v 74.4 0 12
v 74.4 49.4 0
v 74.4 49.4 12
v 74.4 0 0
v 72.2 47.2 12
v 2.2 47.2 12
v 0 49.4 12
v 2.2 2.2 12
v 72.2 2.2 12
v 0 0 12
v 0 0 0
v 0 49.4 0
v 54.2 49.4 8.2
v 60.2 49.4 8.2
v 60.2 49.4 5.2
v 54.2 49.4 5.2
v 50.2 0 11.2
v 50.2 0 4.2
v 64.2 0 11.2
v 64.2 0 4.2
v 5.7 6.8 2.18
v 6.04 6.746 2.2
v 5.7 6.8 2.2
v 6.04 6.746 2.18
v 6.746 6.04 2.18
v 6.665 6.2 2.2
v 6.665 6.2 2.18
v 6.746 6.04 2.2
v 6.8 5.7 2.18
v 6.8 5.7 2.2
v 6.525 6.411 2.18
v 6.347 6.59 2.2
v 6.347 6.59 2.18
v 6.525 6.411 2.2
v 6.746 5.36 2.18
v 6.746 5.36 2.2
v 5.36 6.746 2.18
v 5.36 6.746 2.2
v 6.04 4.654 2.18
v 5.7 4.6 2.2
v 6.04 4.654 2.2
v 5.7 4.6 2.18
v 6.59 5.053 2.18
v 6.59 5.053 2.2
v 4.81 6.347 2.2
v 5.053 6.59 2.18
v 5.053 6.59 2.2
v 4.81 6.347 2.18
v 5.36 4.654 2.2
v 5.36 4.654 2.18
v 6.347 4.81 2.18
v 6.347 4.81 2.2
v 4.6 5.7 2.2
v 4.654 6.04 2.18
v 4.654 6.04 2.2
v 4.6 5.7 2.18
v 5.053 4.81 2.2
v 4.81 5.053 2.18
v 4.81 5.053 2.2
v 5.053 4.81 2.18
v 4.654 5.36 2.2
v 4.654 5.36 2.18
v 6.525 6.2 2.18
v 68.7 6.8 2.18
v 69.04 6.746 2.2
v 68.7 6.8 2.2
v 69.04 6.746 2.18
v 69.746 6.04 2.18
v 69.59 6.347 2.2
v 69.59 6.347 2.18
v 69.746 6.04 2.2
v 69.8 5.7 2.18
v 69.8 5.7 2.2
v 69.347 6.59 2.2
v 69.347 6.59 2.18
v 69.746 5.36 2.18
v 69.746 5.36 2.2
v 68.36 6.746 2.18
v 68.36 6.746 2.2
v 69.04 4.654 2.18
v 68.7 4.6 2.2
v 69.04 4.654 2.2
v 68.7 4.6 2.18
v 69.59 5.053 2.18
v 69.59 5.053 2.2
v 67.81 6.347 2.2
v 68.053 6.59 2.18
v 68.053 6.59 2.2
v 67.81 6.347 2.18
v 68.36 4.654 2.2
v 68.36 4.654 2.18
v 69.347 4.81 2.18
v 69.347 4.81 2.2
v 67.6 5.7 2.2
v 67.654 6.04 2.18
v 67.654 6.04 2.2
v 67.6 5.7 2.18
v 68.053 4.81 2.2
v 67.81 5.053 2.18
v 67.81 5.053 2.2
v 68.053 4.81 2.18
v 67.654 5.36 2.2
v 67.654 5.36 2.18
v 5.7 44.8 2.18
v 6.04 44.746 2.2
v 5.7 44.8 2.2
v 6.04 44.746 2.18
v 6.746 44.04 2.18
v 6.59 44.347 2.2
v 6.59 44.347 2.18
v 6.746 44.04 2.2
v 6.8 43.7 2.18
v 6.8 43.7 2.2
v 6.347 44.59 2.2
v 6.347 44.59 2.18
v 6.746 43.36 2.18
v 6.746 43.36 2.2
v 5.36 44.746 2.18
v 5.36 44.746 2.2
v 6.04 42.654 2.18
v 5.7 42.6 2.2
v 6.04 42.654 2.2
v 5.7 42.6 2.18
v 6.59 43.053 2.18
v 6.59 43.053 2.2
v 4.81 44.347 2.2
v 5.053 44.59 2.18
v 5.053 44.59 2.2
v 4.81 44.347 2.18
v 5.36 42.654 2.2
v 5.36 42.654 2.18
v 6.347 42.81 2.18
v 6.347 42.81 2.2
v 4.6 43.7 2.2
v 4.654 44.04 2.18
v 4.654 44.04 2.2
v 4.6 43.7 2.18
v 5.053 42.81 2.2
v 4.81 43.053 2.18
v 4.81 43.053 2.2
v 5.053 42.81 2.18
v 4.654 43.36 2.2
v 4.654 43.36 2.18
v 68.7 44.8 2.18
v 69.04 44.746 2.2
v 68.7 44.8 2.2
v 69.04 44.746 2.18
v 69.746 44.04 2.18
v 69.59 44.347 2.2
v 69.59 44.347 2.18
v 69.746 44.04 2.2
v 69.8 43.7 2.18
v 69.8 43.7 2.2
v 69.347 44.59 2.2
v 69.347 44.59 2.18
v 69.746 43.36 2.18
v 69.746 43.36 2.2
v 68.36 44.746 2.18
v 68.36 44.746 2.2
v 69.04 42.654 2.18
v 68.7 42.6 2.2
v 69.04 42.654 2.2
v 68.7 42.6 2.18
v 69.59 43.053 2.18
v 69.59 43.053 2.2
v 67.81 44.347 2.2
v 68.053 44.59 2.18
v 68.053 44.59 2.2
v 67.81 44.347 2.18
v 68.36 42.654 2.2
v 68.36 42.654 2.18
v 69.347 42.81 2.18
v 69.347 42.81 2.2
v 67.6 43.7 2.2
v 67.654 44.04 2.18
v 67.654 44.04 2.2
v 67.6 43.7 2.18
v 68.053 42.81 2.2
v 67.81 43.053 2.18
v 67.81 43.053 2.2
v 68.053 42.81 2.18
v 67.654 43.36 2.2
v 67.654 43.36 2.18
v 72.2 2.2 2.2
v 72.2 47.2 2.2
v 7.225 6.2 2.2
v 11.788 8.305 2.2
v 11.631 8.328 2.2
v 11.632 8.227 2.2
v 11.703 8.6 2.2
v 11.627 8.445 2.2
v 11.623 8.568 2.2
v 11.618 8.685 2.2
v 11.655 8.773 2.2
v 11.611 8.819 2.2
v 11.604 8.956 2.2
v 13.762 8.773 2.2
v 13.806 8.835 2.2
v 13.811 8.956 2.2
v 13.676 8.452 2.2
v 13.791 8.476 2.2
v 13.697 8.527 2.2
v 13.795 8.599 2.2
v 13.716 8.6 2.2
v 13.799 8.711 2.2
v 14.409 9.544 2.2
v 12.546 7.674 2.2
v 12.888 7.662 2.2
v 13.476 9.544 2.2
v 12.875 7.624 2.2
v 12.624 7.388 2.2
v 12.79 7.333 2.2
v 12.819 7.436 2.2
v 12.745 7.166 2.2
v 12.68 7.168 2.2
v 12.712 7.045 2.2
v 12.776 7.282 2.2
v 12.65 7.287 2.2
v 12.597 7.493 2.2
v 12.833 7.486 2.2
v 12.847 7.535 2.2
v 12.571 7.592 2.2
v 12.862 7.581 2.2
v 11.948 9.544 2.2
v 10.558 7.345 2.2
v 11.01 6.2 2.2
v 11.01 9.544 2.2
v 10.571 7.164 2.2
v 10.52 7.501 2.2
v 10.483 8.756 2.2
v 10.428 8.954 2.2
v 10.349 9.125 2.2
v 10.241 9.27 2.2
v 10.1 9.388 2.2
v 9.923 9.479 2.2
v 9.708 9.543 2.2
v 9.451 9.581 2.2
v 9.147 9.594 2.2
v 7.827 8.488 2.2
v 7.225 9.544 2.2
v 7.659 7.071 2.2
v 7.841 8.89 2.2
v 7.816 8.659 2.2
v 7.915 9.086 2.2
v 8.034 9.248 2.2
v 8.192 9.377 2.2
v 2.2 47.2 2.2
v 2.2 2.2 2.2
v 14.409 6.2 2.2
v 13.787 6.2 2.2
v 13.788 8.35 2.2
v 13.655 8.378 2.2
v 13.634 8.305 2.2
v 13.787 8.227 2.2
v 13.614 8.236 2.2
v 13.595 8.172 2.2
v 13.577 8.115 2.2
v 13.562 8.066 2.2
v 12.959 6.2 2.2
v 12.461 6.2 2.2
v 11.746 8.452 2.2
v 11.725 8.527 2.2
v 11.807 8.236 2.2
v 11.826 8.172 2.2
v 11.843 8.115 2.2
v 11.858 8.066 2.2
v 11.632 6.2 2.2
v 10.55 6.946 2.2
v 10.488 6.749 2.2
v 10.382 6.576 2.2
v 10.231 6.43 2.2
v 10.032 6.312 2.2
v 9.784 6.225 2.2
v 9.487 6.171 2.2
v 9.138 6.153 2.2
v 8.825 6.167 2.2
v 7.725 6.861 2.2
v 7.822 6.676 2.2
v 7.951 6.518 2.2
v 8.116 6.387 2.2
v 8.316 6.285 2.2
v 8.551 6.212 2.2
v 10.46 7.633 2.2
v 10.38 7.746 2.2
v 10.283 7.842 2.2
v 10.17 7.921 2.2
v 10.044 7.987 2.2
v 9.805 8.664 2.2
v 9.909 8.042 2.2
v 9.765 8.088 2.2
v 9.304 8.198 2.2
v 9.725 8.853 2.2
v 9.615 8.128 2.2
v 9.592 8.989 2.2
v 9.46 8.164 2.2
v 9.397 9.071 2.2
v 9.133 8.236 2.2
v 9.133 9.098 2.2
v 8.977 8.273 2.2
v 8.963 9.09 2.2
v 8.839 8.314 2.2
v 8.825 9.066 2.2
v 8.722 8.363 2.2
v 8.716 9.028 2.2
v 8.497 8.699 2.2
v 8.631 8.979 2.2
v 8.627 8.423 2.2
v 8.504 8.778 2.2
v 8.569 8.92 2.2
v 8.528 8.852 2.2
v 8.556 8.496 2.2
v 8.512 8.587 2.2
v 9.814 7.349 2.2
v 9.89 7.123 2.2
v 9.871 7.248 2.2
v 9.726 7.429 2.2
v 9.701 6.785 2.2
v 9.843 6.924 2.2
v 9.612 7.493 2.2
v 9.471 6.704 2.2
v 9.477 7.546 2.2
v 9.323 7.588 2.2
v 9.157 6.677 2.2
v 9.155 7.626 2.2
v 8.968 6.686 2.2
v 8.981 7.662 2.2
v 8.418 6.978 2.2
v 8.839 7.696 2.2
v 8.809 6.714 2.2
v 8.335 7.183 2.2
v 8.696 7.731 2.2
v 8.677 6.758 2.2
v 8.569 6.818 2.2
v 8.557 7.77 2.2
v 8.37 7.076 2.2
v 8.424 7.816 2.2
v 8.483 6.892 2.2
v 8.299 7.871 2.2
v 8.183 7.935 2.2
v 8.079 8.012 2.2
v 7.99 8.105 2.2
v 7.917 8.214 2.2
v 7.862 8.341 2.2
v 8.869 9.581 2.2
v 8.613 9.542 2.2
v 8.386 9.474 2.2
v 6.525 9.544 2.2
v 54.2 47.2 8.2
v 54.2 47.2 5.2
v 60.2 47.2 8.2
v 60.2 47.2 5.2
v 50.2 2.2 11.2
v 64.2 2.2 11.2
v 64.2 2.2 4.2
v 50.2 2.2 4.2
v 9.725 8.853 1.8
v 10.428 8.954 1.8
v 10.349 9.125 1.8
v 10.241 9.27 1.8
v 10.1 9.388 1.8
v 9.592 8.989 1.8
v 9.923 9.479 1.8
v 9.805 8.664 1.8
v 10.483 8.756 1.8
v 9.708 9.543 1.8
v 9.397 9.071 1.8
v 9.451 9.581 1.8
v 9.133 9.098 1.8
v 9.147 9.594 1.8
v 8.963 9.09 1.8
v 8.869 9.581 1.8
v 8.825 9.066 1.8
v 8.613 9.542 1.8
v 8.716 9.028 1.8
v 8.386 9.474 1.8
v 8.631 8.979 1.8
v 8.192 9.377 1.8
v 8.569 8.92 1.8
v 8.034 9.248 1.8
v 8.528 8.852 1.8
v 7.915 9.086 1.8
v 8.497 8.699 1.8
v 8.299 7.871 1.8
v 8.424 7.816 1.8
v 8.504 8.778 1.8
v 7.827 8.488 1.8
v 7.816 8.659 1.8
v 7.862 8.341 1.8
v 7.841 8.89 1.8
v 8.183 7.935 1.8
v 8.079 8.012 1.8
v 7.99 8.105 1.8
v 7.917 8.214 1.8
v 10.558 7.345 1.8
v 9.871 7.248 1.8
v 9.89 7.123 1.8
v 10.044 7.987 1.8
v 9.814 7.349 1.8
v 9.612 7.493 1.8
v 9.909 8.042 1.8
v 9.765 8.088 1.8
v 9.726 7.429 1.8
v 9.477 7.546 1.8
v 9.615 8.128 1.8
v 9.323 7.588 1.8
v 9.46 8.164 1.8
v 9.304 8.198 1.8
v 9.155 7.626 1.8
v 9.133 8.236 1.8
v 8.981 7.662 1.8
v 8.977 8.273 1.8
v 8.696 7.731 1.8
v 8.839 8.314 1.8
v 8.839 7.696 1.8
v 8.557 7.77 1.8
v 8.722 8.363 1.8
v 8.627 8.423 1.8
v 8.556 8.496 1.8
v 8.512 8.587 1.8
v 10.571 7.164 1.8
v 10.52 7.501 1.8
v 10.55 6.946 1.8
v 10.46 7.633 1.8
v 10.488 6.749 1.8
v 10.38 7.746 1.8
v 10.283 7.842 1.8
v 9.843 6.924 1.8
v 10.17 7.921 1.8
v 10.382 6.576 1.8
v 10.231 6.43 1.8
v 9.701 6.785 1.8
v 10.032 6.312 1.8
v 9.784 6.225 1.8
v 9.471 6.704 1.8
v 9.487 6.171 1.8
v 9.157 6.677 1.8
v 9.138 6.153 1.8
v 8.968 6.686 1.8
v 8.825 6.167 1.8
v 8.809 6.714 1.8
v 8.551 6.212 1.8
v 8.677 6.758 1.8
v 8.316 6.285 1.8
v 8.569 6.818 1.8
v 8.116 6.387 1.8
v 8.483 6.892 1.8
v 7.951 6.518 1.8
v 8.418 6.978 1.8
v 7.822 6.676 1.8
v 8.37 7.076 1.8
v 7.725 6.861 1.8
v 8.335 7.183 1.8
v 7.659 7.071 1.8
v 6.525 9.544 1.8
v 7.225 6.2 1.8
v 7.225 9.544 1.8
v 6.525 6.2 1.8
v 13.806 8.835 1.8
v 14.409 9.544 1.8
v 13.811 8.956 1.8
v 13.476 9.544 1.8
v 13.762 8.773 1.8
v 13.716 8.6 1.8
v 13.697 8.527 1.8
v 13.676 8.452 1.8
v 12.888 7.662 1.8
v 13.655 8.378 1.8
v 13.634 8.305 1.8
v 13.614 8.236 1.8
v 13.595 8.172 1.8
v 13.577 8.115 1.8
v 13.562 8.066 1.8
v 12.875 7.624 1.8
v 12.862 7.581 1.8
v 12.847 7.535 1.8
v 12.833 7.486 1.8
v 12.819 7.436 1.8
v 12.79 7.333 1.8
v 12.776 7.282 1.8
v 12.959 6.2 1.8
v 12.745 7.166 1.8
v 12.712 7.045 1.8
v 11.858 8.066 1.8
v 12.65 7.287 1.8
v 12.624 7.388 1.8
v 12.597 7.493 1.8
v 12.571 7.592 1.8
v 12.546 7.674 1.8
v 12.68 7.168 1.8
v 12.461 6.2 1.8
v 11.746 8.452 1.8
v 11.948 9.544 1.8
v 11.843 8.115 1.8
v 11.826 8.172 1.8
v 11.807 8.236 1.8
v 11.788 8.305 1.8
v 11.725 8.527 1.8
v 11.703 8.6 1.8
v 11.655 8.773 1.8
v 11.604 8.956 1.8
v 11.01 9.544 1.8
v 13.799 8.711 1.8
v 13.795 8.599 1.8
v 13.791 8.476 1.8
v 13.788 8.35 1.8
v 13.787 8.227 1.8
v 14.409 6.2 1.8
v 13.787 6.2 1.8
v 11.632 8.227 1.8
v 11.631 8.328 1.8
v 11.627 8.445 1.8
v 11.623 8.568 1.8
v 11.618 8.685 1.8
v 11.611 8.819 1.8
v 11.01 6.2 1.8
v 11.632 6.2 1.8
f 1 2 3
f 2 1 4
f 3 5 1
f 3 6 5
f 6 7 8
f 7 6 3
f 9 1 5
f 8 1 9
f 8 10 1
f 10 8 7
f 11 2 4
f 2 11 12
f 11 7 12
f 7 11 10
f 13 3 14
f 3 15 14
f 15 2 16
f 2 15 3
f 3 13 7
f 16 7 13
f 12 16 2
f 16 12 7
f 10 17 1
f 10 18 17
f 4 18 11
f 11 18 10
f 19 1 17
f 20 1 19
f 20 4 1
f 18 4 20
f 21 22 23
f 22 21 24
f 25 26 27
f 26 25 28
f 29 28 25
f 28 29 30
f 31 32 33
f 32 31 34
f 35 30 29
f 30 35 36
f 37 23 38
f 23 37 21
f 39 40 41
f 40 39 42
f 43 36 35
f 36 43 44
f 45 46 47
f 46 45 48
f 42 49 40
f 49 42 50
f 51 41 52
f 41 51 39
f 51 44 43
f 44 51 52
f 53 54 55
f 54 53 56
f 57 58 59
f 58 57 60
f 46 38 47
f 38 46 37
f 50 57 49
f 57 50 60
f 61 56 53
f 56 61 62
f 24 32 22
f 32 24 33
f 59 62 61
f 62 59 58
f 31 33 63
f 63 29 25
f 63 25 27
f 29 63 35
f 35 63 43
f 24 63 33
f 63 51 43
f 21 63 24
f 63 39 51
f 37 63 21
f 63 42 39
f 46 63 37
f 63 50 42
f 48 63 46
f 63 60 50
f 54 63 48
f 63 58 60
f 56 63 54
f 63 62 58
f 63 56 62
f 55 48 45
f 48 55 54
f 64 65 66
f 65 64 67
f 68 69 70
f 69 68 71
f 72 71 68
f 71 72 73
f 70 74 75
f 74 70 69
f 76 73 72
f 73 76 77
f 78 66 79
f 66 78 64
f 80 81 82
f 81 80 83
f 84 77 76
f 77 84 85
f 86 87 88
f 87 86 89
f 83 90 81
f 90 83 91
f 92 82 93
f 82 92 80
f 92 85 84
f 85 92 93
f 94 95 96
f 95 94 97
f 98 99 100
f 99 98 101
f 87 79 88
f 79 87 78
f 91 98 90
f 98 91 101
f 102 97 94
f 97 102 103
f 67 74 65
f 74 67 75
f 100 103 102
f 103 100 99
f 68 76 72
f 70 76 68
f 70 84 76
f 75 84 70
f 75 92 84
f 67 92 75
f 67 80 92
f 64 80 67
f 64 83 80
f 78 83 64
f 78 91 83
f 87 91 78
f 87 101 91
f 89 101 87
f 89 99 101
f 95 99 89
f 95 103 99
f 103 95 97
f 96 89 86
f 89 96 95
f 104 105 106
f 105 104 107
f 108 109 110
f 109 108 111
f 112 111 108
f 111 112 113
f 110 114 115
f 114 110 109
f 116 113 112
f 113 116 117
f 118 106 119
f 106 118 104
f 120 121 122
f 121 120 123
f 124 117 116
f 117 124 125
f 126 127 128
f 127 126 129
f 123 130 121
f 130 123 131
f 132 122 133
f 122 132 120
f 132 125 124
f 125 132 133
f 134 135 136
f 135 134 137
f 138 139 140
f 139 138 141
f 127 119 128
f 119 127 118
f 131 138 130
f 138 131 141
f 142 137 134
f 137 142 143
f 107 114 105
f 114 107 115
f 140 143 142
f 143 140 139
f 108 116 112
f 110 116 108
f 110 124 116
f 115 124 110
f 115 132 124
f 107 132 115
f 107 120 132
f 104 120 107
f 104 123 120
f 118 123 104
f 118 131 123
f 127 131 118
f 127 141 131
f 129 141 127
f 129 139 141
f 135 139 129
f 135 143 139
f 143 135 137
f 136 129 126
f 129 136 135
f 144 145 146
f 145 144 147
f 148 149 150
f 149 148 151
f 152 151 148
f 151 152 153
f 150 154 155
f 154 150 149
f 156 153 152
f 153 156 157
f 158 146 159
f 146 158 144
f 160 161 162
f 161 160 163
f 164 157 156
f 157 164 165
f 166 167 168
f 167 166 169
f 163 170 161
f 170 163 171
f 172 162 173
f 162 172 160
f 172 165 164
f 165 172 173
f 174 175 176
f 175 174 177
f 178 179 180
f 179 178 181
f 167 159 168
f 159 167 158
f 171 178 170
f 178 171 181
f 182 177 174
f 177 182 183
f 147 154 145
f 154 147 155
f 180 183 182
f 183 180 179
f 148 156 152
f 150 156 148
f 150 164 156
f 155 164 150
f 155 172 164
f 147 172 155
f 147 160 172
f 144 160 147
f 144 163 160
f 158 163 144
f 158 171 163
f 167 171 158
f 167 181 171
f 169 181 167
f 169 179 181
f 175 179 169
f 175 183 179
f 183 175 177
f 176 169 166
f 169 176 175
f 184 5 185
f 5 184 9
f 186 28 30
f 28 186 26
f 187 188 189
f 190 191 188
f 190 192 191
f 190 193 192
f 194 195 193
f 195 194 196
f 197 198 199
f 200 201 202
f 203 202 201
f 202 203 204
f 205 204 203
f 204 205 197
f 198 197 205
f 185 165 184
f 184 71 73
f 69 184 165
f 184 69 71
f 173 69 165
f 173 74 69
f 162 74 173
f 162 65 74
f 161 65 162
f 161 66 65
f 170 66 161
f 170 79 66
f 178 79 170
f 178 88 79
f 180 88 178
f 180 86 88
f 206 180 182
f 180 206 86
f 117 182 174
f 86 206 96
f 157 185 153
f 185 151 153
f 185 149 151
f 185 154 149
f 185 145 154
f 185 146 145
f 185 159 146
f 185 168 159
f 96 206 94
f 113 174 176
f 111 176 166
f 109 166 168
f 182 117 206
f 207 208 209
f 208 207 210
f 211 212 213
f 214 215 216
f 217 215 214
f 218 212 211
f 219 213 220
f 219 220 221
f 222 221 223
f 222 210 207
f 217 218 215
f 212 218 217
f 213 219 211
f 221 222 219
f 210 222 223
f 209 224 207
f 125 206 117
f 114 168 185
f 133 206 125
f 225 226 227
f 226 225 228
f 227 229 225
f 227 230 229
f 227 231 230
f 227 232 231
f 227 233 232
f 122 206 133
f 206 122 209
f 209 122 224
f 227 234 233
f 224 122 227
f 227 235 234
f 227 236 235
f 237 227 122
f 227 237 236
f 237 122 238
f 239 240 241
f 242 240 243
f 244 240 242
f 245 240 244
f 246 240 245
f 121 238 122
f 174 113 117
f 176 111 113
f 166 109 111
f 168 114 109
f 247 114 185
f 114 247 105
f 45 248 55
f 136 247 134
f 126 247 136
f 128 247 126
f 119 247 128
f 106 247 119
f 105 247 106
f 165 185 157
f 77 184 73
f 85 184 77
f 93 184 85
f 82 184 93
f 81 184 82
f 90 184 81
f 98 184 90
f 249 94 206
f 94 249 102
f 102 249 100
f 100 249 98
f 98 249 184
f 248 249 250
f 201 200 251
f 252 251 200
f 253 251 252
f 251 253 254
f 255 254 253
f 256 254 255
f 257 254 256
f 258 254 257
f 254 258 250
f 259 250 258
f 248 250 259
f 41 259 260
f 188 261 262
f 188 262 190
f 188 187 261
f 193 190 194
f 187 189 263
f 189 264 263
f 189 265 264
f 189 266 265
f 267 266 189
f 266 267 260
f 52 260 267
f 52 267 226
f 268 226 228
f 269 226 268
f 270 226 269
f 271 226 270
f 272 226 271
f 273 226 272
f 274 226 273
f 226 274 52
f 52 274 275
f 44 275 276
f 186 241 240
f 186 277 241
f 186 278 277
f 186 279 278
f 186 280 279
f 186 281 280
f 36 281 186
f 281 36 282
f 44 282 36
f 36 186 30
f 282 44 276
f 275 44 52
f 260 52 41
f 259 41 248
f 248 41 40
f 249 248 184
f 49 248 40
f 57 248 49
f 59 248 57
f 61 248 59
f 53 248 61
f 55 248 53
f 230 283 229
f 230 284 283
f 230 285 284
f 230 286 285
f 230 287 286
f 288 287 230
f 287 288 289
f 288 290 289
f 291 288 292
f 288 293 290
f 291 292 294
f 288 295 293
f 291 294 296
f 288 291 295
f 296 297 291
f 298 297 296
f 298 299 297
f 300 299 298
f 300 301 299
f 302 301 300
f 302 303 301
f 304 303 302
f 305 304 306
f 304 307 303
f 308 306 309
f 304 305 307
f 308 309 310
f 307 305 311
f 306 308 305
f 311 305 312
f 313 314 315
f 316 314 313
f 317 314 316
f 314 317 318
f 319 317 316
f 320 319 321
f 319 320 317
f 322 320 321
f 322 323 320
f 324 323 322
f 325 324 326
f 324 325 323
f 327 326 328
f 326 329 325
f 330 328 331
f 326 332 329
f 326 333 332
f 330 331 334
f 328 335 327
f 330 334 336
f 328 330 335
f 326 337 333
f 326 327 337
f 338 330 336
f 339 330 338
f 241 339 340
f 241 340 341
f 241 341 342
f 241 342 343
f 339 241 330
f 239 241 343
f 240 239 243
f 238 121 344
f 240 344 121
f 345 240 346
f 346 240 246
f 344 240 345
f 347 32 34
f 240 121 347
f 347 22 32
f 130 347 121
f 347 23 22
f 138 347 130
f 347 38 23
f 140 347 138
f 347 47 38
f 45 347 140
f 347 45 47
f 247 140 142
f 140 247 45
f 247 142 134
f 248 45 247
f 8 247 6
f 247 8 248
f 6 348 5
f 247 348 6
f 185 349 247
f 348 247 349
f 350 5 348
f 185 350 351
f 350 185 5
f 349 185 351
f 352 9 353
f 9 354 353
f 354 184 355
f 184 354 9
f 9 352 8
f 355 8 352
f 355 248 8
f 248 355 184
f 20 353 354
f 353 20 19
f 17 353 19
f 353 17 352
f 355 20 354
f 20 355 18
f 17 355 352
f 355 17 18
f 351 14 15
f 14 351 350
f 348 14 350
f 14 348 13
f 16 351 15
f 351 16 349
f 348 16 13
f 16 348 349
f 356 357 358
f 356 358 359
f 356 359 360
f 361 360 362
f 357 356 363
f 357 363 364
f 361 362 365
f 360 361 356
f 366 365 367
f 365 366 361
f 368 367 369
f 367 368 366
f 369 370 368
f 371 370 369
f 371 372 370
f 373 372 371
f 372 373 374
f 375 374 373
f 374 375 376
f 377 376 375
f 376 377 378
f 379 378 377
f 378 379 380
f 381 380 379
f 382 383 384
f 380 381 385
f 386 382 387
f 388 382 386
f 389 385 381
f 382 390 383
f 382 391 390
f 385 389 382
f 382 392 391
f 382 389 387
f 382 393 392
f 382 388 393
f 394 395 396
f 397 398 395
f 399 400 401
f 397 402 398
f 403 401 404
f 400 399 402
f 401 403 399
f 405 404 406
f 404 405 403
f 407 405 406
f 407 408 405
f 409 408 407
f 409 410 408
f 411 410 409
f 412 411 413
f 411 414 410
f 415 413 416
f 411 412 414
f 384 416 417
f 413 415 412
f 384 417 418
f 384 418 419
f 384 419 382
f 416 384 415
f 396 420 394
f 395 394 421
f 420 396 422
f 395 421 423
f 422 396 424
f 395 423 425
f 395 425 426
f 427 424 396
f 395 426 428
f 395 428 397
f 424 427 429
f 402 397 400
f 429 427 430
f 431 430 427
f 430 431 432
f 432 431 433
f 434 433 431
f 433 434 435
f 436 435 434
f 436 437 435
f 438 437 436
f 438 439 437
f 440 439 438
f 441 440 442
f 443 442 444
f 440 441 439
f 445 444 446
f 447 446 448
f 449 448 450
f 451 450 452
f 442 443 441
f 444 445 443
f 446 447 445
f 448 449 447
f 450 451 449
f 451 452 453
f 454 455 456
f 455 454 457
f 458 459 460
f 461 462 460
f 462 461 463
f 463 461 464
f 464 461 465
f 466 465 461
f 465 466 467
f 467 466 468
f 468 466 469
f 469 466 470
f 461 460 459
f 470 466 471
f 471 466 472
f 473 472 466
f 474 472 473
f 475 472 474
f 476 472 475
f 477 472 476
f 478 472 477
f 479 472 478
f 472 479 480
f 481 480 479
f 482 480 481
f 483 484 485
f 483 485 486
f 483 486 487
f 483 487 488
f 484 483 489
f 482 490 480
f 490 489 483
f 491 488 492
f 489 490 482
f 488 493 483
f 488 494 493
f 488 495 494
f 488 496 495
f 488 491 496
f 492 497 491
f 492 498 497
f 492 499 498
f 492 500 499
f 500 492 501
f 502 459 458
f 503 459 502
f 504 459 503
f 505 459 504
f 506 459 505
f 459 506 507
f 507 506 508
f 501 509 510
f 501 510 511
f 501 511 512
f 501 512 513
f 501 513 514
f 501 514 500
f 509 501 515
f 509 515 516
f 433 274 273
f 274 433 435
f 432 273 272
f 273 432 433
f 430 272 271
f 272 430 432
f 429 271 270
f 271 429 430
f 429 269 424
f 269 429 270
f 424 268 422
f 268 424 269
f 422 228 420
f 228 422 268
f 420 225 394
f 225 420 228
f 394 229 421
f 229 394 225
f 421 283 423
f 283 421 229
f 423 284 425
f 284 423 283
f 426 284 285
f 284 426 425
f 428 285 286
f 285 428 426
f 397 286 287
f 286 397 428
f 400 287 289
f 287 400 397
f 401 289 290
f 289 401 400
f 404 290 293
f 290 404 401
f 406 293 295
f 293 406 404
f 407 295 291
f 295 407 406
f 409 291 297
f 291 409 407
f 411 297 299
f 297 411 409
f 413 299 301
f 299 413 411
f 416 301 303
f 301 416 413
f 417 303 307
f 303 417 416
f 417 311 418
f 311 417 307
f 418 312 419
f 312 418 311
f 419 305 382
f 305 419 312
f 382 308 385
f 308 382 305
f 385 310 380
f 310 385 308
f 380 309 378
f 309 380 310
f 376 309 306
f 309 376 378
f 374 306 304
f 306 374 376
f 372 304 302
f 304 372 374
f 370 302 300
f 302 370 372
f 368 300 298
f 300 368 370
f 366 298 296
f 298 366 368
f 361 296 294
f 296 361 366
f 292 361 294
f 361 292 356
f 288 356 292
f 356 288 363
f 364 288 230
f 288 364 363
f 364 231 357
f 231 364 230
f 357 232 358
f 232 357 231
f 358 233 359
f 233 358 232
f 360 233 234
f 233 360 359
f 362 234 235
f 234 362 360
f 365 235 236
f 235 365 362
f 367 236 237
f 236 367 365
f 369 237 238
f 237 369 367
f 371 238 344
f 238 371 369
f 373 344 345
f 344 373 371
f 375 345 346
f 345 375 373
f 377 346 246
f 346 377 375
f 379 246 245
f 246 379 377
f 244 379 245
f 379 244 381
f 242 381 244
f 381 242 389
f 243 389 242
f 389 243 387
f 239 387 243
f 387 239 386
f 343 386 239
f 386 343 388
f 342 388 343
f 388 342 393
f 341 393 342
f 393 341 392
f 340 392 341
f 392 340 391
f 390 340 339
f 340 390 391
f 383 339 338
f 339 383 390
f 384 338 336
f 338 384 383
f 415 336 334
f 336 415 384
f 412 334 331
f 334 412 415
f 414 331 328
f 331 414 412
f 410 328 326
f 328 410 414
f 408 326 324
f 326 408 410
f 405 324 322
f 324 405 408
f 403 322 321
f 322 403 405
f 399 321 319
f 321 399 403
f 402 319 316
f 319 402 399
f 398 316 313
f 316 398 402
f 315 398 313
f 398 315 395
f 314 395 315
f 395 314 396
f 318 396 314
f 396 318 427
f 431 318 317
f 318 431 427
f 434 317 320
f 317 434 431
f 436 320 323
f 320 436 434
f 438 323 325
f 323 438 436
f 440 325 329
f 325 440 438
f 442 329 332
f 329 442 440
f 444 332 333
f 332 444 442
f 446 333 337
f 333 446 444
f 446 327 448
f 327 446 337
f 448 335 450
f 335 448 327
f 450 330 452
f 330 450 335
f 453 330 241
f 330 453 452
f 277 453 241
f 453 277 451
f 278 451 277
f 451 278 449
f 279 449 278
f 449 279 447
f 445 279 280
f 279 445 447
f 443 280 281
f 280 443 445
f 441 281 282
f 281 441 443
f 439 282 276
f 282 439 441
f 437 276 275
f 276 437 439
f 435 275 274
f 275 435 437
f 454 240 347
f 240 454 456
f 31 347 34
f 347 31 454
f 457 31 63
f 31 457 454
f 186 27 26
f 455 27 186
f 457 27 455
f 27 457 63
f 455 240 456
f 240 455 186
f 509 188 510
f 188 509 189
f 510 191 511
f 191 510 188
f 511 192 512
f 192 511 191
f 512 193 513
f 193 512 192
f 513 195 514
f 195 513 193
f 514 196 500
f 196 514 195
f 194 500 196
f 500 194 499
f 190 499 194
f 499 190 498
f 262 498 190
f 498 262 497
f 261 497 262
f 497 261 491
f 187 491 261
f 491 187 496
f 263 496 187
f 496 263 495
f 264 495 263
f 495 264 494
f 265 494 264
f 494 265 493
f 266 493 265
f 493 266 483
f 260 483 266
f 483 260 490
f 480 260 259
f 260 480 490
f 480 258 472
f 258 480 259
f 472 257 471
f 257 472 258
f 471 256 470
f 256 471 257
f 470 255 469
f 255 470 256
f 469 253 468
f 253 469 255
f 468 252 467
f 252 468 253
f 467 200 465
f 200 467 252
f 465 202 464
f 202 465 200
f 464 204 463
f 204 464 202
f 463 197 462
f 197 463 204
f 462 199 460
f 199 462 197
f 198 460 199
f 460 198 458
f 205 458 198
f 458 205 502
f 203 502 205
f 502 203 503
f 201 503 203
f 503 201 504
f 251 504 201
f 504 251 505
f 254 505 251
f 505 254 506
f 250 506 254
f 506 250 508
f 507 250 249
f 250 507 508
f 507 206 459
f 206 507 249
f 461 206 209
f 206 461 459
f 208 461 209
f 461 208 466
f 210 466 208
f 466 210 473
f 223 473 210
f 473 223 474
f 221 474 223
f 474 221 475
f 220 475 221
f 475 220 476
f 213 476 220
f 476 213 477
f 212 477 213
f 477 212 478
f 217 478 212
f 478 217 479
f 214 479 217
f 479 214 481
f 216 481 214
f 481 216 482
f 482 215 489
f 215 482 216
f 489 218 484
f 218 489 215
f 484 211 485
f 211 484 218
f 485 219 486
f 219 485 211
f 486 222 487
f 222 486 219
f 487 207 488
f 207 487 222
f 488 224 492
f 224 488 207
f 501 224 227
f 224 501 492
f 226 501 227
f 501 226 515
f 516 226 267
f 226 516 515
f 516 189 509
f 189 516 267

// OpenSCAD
// ISM Thumb Drive shell (original ISM)
// Manifold-safe: bosses unioned, openings cut in one difference().
pcb_w = 70;
pcb_d = 45;
wall = 2.2;
box_h = 12;
eps = 0.02;
mount_d = 2.2;
badge_depth = 0.4;

mounts = [[3.5, 3.5], [pcb_w - 3.5, 3.5], [3.5, pcb_d - 3.5], [pcb_w - 3.5, pcb_d - 3.5]];

module stick() {
  difference() {
    union() {
      cube([pcb_w + 2 * wall, pcb_d + 2 * wall, box_h]);
      for (p = mounts)
        translate([p[0] + wall, p[1] + wall, wall - eps])
          cylinder(h = 4 + eps, d = 5, $fn = 24);
    }
    translate([wall, wall, wall])
      cube([pcb_w, pcb_d, box_h - wall + eps]);
    // USB-C nose
    translate([wall + pcb_w - 22, -eps, wall + 2])
      cube([14, wall + 4, 7]);
    // LED window
    translate([wall + pcb_w - 18, wall + pcb_d - 1, wall + 3])
      cube([6, wall + 2, 3]);
    for (p = mounts)
      translate([p[0] + wall, p[1] + wall, wall - eps])
        cylinder(h = 8 + 2 * eps, d = mount_d, $fn = 20);
    translate([wall + 4, wall + 4, wall - badge_depth])
      linear_extrude(height = badge_depth + eps)
        text("ISM", size = 3.5, font = "Liberation Sans:style=Bold");
  }
}

module cap() {
  // Removable end-cap silhouette for print check
  w = 20;
  d = pcb_d + 2 * wall + 1;
  h = box_h + 1;
  difference() {
    cube([w, d, h]);
    translate([2, 2, 2])
      cube([w - 4, d - 4, h]);
    translate([4, 4, h - 0.4])
      linear_extrude(height = 0.5)
        text("TD", size = 3, font = "Liberation Sans:style=Bold");
  }
}

stick();
